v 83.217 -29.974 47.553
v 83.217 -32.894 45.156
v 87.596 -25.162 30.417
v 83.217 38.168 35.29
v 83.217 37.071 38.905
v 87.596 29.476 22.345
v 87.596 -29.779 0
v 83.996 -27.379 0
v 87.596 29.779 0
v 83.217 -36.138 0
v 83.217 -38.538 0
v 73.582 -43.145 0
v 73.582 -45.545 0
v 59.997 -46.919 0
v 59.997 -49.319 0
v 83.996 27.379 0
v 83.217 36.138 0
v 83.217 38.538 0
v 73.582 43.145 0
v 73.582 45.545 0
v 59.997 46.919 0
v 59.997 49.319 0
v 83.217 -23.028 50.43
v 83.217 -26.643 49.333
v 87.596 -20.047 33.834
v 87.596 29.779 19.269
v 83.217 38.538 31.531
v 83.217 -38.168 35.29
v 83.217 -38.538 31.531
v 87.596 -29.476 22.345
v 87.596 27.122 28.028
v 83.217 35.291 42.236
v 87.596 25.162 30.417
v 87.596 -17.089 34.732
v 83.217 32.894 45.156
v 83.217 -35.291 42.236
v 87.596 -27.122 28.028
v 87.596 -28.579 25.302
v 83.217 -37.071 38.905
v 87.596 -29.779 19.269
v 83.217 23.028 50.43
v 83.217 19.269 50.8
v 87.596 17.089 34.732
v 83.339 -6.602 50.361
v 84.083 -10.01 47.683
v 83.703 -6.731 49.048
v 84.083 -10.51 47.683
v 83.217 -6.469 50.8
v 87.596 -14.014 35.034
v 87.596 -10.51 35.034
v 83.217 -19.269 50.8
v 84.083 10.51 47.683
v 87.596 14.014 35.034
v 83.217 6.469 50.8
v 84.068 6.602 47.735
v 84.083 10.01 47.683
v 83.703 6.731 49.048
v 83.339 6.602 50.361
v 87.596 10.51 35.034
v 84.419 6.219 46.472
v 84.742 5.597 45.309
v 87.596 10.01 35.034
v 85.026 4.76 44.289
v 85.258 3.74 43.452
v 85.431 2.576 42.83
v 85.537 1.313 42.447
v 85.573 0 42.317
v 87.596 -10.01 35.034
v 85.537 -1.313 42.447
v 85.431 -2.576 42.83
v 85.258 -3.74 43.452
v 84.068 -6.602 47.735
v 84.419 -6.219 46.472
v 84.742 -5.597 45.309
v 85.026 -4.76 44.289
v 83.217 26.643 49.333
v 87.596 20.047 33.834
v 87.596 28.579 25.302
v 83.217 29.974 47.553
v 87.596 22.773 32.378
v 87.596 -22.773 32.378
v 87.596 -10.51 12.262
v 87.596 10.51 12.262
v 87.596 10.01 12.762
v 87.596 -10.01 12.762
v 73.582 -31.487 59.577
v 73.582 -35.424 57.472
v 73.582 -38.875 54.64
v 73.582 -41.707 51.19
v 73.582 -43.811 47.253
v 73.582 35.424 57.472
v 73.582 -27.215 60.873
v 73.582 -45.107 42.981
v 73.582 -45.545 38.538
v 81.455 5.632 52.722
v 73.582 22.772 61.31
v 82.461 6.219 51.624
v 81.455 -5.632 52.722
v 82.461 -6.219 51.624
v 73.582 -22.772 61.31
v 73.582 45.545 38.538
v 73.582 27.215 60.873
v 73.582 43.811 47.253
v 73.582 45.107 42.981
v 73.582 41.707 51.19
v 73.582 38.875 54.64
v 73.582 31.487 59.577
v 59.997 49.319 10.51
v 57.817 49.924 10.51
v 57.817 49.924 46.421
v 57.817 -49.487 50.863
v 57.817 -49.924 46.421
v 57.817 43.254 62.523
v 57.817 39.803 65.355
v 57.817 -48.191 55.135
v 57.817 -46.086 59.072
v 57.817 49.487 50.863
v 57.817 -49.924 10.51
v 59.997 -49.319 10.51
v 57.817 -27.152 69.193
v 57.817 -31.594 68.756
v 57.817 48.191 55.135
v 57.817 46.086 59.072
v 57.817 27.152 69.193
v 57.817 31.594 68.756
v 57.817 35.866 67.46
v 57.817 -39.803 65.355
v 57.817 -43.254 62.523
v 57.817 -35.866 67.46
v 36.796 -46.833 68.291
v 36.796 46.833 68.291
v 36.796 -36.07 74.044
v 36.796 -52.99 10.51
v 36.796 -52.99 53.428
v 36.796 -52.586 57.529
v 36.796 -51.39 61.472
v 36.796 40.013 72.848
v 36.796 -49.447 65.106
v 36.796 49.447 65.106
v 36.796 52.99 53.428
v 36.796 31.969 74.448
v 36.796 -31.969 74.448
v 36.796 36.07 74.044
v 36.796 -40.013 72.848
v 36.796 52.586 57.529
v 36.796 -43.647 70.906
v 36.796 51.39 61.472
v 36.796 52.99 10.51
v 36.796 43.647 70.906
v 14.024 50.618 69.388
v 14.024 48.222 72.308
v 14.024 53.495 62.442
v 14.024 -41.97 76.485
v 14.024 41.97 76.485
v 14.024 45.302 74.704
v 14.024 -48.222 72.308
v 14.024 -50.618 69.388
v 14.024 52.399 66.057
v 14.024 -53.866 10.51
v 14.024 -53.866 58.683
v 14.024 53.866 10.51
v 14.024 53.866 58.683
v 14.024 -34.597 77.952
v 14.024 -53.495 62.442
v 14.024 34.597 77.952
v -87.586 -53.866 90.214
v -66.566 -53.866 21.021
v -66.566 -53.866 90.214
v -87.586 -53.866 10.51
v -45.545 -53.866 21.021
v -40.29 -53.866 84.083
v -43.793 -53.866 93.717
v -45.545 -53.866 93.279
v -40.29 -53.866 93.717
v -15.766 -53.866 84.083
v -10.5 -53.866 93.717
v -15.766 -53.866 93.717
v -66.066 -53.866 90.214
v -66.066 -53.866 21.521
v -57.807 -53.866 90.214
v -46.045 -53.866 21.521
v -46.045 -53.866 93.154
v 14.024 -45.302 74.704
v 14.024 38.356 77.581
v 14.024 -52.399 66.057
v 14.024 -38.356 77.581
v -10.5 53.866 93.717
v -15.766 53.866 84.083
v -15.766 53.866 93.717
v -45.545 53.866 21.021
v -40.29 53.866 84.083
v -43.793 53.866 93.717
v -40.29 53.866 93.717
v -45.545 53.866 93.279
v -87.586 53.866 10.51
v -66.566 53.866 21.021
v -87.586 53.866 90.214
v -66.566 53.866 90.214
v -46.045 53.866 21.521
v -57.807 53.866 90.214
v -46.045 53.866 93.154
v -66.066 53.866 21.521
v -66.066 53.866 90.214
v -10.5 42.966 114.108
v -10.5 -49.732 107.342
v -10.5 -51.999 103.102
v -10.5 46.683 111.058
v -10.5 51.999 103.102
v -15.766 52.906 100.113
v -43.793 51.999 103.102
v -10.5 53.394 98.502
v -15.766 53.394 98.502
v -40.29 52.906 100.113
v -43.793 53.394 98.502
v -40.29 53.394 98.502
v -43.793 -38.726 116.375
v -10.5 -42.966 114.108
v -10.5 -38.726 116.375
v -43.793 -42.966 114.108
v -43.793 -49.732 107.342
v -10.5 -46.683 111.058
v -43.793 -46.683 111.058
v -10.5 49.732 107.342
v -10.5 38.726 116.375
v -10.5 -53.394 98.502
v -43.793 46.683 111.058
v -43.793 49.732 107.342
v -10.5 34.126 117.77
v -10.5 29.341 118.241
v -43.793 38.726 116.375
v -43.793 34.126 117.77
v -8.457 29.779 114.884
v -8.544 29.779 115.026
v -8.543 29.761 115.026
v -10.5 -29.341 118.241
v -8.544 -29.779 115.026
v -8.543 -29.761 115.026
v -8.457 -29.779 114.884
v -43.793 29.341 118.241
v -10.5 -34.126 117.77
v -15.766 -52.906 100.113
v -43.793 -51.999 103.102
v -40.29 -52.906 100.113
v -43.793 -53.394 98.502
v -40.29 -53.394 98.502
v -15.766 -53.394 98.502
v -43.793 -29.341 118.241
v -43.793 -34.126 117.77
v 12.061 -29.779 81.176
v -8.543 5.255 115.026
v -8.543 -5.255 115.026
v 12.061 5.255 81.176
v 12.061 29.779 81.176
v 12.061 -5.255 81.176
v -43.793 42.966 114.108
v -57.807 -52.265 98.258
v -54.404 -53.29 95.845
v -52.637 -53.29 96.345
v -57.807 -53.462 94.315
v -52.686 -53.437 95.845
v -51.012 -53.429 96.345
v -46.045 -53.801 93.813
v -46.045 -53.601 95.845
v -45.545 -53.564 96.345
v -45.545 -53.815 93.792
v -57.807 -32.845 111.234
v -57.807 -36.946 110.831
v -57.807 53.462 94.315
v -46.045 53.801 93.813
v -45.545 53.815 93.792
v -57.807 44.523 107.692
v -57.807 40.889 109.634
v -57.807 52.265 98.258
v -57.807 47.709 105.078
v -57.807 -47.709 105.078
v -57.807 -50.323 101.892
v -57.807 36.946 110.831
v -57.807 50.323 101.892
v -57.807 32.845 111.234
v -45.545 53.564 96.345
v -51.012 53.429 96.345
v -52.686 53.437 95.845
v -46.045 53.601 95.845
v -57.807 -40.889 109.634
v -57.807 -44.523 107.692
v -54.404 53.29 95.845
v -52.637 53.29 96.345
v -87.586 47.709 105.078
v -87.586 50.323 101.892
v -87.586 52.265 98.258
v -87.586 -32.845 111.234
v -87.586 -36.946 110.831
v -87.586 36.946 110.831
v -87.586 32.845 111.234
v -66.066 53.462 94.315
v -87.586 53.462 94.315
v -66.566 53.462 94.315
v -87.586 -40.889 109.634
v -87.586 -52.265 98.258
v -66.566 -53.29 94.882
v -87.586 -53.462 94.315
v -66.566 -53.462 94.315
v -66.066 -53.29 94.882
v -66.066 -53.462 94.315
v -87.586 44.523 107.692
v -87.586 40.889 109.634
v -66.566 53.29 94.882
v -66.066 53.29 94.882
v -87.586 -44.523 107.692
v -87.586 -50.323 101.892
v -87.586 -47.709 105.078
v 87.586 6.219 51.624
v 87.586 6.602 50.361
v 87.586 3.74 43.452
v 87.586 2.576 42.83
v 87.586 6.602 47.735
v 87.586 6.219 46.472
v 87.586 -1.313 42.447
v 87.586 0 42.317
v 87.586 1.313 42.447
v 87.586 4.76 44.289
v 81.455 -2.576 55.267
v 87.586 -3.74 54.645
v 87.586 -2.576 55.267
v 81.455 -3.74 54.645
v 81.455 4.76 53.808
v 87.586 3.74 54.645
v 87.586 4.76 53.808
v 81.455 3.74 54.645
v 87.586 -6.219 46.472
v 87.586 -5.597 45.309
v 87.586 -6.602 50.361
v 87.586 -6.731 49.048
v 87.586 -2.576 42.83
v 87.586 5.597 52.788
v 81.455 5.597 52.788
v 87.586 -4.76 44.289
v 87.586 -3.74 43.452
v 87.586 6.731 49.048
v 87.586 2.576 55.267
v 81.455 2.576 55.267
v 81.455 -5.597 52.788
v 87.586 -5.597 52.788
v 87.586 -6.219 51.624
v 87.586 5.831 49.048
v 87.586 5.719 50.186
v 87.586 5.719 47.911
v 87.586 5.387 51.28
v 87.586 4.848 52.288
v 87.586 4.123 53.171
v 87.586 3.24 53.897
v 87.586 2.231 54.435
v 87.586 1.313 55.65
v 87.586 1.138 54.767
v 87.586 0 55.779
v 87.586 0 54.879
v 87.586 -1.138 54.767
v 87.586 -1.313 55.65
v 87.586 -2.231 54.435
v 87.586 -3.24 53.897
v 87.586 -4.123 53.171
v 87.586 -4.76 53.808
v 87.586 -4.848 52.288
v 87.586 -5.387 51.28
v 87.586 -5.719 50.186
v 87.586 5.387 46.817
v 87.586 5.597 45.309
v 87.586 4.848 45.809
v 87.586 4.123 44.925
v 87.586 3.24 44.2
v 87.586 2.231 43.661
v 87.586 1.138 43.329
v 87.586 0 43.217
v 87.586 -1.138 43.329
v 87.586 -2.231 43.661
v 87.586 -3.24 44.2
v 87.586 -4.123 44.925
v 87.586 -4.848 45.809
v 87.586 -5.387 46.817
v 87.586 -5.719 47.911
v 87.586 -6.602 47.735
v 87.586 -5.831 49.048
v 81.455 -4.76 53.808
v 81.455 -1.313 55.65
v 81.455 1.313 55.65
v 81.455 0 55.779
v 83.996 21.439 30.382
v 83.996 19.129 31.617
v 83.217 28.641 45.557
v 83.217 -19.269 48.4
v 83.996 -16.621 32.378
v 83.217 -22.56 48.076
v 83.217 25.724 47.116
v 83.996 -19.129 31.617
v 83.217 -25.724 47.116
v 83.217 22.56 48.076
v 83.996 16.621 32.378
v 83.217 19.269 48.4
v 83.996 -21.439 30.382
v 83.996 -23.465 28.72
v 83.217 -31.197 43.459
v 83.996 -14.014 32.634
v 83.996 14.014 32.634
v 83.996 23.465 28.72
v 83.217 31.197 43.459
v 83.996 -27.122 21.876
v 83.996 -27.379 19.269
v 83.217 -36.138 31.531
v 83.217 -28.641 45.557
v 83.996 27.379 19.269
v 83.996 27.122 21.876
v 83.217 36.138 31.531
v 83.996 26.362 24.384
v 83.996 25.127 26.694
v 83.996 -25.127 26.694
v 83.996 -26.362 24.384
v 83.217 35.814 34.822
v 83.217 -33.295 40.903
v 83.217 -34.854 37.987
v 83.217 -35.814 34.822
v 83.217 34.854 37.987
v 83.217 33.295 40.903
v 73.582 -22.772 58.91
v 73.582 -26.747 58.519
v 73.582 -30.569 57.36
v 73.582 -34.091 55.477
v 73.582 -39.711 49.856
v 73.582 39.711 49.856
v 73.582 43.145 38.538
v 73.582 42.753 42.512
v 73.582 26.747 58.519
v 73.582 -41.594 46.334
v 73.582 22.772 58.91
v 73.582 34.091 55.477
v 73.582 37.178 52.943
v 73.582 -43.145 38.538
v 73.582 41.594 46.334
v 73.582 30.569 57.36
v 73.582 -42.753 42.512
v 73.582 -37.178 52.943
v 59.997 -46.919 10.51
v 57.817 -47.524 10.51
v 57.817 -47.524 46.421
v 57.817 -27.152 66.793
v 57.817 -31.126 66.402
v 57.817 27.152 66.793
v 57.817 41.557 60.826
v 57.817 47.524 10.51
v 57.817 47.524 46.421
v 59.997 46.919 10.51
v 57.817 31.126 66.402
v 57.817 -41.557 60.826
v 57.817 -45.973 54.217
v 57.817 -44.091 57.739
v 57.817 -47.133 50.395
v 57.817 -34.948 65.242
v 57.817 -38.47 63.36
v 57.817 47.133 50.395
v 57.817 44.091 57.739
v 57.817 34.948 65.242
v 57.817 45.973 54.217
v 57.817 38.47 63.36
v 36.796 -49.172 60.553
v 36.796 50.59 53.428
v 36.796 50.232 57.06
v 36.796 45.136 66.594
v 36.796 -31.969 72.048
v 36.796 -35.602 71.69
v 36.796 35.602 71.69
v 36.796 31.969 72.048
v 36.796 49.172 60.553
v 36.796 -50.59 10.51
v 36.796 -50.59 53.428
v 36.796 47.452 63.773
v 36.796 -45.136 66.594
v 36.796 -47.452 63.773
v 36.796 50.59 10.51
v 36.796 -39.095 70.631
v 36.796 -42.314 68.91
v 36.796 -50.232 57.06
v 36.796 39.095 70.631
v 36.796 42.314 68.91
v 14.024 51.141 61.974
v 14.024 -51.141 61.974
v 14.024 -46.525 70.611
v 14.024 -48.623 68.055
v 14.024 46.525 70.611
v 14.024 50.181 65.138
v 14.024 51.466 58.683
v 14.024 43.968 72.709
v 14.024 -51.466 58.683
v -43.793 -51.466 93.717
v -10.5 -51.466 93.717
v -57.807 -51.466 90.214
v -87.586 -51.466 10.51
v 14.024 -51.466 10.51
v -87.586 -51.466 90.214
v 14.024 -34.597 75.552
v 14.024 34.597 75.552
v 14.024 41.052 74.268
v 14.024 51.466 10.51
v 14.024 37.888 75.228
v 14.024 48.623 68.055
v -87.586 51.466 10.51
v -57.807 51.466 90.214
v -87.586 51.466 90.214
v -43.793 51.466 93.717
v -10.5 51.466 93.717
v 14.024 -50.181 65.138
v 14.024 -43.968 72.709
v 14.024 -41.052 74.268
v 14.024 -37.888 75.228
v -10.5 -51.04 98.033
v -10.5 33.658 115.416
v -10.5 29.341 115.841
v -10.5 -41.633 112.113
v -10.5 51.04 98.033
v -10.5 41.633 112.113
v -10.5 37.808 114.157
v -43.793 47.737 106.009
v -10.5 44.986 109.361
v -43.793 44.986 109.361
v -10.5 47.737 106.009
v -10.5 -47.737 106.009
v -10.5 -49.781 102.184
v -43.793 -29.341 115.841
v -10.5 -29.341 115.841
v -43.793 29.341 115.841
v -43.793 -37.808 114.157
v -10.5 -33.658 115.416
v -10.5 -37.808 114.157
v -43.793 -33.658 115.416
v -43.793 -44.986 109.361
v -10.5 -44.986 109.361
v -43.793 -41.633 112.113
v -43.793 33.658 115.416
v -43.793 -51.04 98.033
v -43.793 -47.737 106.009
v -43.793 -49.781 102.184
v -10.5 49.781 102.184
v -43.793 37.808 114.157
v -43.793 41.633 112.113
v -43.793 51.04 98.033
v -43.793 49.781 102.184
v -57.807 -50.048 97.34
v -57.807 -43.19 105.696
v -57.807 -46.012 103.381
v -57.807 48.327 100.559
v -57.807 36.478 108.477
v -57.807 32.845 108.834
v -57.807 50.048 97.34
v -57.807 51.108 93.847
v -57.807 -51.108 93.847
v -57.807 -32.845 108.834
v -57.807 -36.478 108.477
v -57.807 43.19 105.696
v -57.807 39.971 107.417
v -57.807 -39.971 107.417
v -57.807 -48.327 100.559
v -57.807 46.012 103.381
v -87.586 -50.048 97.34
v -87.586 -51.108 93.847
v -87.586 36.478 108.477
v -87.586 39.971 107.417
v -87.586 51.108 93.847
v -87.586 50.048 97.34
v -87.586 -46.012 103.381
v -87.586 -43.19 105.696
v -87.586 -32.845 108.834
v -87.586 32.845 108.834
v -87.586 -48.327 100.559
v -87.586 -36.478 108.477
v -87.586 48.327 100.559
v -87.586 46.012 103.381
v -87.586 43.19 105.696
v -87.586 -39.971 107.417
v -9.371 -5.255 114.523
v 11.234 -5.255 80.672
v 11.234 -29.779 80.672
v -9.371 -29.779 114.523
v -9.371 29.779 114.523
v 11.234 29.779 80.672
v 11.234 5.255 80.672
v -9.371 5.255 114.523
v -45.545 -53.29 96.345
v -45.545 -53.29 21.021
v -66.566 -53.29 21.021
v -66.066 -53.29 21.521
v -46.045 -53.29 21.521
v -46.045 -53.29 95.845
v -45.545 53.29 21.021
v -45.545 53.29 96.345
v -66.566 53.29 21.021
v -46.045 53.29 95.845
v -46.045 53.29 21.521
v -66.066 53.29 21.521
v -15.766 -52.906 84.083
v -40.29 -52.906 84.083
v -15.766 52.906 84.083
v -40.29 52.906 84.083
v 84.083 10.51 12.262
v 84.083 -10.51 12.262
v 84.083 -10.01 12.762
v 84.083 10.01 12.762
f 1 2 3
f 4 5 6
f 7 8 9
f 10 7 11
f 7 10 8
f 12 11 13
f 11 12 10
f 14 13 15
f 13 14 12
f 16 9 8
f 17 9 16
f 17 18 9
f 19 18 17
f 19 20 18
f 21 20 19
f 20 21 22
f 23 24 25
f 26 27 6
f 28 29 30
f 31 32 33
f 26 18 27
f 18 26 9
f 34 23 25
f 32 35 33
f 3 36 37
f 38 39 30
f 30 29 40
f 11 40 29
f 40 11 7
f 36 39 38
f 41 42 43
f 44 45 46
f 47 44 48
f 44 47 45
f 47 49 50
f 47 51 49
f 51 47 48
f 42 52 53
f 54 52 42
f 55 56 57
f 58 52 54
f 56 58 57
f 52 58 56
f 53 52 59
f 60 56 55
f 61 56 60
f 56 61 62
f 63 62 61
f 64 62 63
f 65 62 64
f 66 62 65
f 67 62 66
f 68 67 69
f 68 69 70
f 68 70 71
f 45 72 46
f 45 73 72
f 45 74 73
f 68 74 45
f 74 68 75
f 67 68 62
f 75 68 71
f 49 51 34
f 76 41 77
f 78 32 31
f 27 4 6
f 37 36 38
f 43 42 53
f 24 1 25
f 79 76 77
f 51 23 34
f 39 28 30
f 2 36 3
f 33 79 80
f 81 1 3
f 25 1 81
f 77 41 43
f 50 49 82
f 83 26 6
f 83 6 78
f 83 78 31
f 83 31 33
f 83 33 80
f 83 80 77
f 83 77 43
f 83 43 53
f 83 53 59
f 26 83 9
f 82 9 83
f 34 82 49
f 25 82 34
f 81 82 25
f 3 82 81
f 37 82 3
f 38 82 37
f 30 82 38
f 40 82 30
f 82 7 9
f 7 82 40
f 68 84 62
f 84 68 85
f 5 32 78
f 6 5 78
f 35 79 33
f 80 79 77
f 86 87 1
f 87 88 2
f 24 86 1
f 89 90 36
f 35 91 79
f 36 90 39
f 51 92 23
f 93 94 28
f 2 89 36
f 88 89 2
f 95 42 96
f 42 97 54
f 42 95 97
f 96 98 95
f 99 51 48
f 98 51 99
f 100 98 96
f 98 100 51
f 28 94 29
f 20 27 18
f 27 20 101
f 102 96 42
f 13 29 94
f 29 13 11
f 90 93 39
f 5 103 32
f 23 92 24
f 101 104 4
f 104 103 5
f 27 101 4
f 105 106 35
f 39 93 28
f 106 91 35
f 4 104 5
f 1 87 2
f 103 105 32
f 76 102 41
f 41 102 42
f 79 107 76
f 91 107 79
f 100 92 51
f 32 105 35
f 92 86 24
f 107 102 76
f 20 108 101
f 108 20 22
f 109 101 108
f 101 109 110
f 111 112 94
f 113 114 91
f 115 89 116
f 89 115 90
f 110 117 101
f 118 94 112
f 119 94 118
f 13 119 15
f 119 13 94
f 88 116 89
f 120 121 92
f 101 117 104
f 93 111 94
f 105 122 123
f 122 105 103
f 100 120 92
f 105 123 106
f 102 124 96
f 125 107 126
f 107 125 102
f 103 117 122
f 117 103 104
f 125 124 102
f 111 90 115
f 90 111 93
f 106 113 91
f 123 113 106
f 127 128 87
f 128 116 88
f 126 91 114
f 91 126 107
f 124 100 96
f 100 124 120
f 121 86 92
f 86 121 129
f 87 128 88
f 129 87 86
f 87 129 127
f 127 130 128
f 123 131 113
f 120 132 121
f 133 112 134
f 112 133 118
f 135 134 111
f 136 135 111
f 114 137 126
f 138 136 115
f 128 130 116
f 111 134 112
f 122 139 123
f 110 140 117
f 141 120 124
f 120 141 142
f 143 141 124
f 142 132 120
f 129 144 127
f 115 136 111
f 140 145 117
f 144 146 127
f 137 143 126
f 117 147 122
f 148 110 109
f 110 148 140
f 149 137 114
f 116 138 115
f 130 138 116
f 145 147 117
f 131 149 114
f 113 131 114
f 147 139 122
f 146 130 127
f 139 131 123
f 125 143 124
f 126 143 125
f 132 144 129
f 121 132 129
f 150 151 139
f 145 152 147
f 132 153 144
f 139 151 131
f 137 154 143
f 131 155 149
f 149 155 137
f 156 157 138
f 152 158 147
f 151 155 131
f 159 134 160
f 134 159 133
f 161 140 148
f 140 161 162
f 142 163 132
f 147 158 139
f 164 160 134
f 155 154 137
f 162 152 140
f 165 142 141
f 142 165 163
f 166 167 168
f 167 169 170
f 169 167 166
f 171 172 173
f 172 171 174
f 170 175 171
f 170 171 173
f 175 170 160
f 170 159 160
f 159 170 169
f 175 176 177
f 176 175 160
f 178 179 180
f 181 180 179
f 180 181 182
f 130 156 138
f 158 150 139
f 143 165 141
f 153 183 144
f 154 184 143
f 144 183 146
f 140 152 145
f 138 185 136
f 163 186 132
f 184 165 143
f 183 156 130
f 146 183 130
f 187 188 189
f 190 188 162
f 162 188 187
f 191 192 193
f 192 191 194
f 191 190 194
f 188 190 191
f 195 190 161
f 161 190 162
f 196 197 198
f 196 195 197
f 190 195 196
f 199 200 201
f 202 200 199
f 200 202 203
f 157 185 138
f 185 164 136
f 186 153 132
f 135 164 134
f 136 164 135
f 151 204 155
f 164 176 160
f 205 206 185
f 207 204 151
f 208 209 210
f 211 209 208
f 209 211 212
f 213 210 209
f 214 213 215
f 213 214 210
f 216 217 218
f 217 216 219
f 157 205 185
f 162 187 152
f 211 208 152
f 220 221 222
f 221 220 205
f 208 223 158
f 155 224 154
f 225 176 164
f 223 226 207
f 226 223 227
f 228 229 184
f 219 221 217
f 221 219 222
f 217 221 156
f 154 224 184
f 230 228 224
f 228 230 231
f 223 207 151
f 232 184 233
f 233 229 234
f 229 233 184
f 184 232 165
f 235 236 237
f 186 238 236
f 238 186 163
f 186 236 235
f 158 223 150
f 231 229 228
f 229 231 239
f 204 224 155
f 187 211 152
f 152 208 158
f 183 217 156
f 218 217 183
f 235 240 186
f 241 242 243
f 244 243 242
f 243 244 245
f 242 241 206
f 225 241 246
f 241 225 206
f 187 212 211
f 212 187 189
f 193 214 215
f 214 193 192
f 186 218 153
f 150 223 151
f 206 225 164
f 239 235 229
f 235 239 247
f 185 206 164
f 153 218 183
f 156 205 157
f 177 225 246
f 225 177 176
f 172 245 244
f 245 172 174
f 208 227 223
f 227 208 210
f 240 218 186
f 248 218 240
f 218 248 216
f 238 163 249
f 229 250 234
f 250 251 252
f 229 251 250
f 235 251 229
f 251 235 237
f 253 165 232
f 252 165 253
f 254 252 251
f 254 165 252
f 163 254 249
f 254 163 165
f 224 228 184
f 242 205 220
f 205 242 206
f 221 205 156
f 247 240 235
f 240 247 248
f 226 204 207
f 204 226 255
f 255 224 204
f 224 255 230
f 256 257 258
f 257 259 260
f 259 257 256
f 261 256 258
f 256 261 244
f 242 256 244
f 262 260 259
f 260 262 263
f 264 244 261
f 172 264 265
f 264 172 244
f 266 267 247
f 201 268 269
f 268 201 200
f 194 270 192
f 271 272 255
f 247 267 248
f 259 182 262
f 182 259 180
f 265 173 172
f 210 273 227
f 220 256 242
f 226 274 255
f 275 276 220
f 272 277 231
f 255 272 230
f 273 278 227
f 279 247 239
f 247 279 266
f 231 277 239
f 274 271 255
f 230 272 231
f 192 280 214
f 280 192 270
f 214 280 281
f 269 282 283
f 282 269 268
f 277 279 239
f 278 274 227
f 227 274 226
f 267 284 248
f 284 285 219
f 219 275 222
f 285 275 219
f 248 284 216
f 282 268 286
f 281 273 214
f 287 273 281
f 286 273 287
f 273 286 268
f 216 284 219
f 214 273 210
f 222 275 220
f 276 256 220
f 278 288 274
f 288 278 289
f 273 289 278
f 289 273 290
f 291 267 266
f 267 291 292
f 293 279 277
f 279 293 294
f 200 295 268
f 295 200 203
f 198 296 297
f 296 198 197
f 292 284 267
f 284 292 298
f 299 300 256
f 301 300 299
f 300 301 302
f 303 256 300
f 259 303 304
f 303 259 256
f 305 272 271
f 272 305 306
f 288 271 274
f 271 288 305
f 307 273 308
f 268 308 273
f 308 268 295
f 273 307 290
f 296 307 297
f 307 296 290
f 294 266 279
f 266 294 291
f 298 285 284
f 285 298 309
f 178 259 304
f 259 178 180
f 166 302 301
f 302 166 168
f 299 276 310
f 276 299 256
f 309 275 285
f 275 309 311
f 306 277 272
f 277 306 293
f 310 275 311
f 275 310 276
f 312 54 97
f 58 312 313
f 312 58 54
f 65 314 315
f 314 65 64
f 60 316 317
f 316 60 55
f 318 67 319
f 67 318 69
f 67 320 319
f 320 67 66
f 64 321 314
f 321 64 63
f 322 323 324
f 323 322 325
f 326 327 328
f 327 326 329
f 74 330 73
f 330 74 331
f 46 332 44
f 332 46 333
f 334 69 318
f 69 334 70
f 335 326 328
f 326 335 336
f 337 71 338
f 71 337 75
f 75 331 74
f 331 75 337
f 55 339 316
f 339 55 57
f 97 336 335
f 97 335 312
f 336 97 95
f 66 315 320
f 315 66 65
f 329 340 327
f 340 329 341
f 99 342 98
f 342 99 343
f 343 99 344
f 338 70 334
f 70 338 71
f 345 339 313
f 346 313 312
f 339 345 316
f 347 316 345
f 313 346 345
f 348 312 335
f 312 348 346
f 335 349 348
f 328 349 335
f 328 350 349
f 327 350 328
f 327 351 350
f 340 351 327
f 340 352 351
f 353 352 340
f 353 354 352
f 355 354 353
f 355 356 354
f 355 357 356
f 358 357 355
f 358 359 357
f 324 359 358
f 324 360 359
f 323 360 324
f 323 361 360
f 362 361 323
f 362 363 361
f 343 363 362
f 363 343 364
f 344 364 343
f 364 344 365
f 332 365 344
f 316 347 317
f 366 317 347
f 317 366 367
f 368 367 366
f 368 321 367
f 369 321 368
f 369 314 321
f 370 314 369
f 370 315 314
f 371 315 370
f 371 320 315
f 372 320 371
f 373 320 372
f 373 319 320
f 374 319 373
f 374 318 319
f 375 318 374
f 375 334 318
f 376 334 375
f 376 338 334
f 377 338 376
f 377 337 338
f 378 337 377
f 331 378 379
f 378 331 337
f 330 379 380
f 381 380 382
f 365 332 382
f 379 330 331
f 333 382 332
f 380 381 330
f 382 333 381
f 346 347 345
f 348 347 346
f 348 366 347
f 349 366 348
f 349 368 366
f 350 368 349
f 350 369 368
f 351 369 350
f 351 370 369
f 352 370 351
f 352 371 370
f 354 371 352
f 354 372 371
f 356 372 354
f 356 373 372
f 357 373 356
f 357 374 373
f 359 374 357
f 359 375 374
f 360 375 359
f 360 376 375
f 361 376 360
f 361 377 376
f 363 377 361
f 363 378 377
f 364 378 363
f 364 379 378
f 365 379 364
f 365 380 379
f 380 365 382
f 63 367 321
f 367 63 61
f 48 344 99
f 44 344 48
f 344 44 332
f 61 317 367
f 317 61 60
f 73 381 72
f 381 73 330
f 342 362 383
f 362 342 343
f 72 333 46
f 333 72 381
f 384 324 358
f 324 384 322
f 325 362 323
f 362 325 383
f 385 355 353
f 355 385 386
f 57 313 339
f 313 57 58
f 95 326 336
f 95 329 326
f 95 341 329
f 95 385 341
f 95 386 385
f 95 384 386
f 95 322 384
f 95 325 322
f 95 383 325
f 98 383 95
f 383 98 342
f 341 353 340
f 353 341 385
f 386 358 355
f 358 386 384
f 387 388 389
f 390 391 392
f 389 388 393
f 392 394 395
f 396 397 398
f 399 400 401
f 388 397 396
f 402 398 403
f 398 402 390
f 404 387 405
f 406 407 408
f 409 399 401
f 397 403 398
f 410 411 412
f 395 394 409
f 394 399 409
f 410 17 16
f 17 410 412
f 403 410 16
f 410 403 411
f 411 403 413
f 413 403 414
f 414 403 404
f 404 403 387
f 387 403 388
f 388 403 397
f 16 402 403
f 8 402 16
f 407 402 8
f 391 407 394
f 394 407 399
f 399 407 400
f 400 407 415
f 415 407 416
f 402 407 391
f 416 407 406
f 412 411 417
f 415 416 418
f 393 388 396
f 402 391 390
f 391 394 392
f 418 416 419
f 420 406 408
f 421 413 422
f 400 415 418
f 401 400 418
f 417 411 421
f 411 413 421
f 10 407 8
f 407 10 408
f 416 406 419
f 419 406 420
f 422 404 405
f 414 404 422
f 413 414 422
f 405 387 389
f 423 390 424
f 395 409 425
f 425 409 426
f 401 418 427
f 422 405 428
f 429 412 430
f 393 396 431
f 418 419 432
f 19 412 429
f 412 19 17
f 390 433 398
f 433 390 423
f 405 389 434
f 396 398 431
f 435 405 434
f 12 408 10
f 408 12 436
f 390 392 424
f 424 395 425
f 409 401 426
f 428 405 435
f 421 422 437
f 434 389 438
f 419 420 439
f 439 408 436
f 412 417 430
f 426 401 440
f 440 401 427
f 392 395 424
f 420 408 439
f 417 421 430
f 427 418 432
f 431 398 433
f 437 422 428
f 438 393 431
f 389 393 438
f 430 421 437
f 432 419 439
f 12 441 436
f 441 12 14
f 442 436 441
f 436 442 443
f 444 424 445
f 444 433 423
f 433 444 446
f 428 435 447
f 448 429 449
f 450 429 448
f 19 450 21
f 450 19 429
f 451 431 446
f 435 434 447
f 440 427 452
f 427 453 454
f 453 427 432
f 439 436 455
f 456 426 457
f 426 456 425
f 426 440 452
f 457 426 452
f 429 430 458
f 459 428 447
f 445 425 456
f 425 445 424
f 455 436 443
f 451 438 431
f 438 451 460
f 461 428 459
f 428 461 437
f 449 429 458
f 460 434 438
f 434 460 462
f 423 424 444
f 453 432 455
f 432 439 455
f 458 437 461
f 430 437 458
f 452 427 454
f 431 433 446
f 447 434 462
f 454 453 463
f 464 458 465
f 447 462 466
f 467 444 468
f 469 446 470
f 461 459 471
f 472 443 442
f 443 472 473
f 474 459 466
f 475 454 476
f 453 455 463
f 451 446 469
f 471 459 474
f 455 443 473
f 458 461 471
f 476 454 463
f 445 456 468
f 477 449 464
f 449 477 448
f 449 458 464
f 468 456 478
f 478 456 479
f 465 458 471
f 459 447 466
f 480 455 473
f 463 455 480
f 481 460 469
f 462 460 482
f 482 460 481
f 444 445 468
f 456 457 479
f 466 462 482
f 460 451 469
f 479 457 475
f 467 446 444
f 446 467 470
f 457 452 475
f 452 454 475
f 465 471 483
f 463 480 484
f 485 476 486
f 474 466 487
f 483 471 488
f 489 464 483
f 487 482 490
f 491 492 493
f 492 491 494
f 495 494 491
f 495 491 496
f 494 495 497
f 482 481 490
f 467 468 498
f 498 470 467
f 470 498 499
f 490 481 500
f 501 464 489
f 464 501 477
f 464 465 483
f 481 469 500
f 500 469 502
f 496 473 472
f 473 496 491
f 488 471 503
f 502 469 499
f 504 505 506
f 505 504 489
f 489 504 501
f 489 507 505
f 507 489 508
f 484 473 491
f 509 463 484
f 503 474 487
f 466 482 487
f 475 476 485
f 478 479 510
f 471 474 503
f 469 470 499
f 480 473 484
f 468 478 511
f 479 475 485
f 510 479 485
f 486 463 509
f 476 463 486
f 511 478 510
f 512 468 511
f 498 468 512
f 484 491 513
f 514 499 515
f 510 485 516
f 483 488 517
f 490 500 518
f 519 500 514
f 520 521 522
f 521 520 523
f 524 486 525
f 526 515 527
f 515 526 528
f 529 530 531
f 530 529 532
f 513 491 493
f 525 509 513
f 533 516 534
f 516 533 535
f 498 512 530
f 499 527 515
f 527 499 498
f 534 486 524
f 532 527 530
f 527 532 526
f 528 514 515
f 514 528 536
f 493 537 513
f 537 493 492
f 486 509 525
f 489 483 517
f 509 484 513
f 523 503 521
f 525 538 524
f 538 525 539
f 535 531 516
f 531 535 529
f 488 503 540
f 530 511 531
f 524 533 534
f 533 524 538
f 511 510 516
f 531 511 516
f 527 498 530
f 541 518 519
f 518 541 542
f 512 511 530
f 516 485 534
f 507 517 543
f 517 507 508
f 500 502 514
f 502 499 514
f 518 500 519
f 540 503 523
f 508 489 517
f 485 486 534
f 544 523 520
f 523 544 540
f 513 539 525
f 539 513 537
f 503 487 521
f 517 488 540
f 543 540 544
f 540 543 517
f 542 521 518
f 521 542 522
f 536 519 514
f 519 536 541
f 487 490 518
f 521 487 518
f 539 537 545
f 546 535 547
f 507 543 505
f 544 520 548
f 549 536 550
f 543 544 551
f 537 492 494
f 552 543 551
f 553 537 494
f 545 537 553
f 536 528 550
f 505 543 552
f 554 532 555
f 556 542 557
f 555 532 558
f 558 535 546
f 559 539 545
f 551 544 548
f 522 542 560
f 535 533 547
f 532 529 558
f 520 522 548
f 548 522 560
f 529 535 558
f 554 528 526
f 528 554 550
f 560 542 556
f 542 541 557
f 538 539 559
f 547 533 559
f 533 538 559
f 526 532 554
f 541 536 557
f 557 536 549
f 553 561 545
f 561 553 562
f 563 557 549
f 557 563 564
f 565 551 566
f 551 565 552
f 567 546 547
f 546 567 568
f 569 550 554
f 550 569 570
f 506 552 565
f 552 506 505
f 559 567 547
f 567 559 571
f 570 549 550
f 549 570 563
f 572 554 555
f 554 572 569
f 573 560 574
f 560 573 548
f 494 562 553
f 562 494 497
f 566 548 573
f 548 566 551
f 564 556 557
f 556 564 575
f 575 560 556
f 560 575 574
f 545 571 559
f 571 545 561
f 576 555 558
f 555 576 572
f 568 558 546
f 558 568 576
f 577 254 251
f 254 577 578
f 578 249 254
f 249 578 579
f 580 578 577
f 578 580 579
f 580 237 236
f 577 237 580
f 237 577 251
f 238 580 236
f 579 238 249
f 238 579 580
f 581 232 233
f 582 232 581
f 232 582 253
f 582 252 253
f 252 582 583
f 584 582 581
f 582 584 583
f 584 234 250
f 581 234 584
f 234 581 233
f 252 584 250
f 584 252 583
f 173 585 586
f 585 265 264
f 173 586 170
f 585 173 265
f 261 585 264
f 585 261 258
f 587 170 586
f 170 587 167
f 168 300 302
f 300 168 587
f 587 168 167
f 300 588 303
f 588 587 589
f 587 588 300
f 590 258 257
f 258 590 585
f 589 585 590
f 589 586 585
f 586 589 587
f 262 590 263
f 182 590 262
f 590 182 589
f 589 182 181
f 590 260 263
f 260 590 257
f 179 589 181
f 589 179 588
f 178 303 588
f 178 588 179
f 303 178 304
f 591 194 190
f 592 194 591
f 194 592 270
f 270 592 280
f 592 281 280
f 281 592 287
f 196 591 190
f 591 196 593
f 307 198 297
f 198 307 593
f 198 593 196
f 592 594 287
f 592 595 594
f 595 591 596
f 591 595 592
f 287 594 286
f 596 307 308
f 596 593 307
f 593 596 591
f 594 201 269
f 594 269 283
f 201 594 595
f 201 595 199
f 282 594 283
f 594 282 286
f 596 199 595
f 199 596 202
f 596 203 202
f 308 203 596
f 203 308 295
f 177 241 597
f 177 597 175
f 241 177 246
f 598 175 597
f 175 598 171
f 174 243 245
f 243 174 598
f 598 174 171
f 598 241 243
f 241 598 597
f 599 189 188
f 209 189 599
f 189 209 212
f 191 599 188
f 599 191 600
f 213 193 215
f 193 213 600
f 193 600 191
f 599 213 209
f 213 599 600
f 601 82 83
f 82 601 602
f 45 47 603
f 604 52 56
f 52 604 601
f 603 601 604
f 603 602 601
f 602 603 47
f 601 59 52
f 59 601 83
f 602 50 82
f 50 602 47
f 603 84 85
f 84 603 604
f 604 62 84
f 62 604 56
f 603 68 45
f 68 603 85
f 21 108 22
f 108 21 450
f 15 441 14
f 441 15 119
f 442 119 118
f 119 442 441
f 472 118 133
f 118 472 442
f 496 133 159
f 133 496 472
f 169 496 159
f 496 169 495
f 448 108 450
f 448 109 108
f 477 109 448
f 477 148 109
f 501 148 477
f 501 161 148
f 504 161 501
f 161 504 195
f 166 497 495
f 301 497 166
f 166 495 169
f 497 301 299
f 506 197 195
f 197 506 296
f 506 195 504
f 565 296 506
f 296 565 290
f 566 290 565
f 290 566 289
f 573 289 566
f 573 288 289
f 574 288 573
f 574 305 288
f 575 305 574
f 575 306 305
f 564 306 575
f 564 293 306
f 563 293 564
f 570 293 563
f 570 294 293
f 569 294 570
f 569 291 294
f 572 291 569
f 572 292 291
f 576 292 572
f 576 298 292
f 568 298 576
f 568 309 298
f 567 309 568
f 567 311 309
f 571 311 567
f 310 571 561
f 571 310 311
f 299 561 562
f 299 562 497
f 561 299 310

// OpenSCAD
// file: ../../library/e7_all.scad
// ==========================================================================
//  e7_all.scad - include this one file. Preview, print plates and the report.
// ==========================================================================
include <e7_params.scad>
include <e7_body.scad>

// whole painted loco
module e7_preview() {
  // carbody in its paint bands
  for (i = [0:len(PAINT_BANDS) - 1]) {
    z0 = i == 0 ? -1 : p(PAINT_BANDS[i - 1][0]);
    z1 = i == len(PAINT_BANDS) - 1 ? 1000 : p(PAINT_BANDS[i][0]);
    color(PAINT_BANDS[i][1]) render(convexity = 8) e7_shell_solid([z0, z1]);
  }
  color(C_GLASS) e7_glass();
  color(C_LENS) let (d = nose_d_at_z(HEADLIGHT[0]))
    translate([XF - p(d) + p(HEADLIGHT[2]) + p(1.5), 0, p(HEADLIGHT[0])]) rotate([0, 90, 0]) cylinder(d = p(HEADLIGHT[1]) - 0.8, h = 0.5, $fn = 32);
  color(C_FRAME) { for (j = [1:NFRAME]) e7_frame_piece(j); e7_pilot(); e7_pilot_rear(); }
  for (tx = [TRK_X, -TRK_X]) translate([tx, 0, 0]) { color(C_TRUCK) e7_truck_frame(); color(C_WHEEL) e7_wheels(); }
}
// thin glass panes sitting in the window pockets (preview only)
module e7_glass() {
  intersection() { e7_loft(DET * 0.6); union() { e7_windshield_cut(); e7_side_cuts_windows_only(); } }
}
module e7_side_cuts_windows_only() {
  for (s = [-1, 1], w = CAB_WIN)
    translate([XF - p(w[1]), s * HW - (s > 0 ? DET : 3 - DET), p(w[2])]) cube([p(w[1] - w[0]), 3, p(w[3] - w[2])]);
}

// one print, laid out for the printer
module e7_plate(part) {
  sec = [for (k = [1:NSEC]) str("body_", k)];
  frm = [for (j = [1:NFRAME]) str("frame_", j)];
  if (is_num(search([part], sec)[0])) {
    k = search([part], sec)[0] + 1;
    // stand the section on its open bottom (skirt edge on the bed)
    translate([-sec_x0(k) - SEC_L / 2, 0, -Z_SKIRT]) e7_body_section(k);
  } else if (is_num(search([part], frm)[0])) {
    j = search([part], frm)[0] + 1;
    xs = concat([FRAME_X0], FRAME_SPLITS, [FRAME_X1]);
    translate([-(xs[j - 1] + xs[j]) / 2, 0, -Z_FRAME_BOT]) e7_frame_piece(j);
  } else if (part == "pilot") {
    translate([-XF, 0, 0]) rotate([0, 0, 0]) translate([0, 0, -p(5)]) e7_pilot();
  } else if (part == "pilot_rear") {
    translate([-XR, 0, 0]) translate([0, 0, -(CPL_Z - CPL_H / 2 - WALL)]) e7_pilot_rear();
  } else if (part == "truck") {
    // upside down, bolster on the bed
    translate([0, 0, Z_FRAME_BOT - 0.3]) rotate([180, 0, 0]) e7_truck_frame();
  } else {
    assert(false, str("unknown part '", part, "'"));
  }
}

module e7_report() {
  echo(str("MILW E7A ", ROAD_NO, " class ", CLASS, " - ", SC, " scale 1:", RATIO, ", paint ", PAINT));
  echo(str("  carbody ", round(BL), " mm long, ", round(2 * HW), " mm wide, roof ", round(Z_ROOF), " mm, cab ", round(Z_CAB), " mm above rail"));
  echo(str("  ", NSEC, " body sections of ", round(SEC_L), " mm; ", NFRAME, " frame pieces; trucks at +/- ", round(TRK_X), " mm"));
  echo(str("  body screws ", SCREW_BODY_NAME, " x ", 2 * len(BOSS_X), "; truck pivots ", PIVOT[1], "; wheels ", round(WHEEL_D * 10) / 10, " mm (bought)"));
}
// main file
// Milwaukee Road E7A, G scale 1-29 - print 4 of 12: body_4 - carbody section 4 (cab and nose; print upright, open side down)
// Render (F6), export STL, print. Settings: ../../library/e7_params.scad
// Whole loco preview and notes: ../../MILW_E7_Main.scad
SCALE_SEL = "G";
include <../../library/e7_all.scad>
e7_plate("body_4");
